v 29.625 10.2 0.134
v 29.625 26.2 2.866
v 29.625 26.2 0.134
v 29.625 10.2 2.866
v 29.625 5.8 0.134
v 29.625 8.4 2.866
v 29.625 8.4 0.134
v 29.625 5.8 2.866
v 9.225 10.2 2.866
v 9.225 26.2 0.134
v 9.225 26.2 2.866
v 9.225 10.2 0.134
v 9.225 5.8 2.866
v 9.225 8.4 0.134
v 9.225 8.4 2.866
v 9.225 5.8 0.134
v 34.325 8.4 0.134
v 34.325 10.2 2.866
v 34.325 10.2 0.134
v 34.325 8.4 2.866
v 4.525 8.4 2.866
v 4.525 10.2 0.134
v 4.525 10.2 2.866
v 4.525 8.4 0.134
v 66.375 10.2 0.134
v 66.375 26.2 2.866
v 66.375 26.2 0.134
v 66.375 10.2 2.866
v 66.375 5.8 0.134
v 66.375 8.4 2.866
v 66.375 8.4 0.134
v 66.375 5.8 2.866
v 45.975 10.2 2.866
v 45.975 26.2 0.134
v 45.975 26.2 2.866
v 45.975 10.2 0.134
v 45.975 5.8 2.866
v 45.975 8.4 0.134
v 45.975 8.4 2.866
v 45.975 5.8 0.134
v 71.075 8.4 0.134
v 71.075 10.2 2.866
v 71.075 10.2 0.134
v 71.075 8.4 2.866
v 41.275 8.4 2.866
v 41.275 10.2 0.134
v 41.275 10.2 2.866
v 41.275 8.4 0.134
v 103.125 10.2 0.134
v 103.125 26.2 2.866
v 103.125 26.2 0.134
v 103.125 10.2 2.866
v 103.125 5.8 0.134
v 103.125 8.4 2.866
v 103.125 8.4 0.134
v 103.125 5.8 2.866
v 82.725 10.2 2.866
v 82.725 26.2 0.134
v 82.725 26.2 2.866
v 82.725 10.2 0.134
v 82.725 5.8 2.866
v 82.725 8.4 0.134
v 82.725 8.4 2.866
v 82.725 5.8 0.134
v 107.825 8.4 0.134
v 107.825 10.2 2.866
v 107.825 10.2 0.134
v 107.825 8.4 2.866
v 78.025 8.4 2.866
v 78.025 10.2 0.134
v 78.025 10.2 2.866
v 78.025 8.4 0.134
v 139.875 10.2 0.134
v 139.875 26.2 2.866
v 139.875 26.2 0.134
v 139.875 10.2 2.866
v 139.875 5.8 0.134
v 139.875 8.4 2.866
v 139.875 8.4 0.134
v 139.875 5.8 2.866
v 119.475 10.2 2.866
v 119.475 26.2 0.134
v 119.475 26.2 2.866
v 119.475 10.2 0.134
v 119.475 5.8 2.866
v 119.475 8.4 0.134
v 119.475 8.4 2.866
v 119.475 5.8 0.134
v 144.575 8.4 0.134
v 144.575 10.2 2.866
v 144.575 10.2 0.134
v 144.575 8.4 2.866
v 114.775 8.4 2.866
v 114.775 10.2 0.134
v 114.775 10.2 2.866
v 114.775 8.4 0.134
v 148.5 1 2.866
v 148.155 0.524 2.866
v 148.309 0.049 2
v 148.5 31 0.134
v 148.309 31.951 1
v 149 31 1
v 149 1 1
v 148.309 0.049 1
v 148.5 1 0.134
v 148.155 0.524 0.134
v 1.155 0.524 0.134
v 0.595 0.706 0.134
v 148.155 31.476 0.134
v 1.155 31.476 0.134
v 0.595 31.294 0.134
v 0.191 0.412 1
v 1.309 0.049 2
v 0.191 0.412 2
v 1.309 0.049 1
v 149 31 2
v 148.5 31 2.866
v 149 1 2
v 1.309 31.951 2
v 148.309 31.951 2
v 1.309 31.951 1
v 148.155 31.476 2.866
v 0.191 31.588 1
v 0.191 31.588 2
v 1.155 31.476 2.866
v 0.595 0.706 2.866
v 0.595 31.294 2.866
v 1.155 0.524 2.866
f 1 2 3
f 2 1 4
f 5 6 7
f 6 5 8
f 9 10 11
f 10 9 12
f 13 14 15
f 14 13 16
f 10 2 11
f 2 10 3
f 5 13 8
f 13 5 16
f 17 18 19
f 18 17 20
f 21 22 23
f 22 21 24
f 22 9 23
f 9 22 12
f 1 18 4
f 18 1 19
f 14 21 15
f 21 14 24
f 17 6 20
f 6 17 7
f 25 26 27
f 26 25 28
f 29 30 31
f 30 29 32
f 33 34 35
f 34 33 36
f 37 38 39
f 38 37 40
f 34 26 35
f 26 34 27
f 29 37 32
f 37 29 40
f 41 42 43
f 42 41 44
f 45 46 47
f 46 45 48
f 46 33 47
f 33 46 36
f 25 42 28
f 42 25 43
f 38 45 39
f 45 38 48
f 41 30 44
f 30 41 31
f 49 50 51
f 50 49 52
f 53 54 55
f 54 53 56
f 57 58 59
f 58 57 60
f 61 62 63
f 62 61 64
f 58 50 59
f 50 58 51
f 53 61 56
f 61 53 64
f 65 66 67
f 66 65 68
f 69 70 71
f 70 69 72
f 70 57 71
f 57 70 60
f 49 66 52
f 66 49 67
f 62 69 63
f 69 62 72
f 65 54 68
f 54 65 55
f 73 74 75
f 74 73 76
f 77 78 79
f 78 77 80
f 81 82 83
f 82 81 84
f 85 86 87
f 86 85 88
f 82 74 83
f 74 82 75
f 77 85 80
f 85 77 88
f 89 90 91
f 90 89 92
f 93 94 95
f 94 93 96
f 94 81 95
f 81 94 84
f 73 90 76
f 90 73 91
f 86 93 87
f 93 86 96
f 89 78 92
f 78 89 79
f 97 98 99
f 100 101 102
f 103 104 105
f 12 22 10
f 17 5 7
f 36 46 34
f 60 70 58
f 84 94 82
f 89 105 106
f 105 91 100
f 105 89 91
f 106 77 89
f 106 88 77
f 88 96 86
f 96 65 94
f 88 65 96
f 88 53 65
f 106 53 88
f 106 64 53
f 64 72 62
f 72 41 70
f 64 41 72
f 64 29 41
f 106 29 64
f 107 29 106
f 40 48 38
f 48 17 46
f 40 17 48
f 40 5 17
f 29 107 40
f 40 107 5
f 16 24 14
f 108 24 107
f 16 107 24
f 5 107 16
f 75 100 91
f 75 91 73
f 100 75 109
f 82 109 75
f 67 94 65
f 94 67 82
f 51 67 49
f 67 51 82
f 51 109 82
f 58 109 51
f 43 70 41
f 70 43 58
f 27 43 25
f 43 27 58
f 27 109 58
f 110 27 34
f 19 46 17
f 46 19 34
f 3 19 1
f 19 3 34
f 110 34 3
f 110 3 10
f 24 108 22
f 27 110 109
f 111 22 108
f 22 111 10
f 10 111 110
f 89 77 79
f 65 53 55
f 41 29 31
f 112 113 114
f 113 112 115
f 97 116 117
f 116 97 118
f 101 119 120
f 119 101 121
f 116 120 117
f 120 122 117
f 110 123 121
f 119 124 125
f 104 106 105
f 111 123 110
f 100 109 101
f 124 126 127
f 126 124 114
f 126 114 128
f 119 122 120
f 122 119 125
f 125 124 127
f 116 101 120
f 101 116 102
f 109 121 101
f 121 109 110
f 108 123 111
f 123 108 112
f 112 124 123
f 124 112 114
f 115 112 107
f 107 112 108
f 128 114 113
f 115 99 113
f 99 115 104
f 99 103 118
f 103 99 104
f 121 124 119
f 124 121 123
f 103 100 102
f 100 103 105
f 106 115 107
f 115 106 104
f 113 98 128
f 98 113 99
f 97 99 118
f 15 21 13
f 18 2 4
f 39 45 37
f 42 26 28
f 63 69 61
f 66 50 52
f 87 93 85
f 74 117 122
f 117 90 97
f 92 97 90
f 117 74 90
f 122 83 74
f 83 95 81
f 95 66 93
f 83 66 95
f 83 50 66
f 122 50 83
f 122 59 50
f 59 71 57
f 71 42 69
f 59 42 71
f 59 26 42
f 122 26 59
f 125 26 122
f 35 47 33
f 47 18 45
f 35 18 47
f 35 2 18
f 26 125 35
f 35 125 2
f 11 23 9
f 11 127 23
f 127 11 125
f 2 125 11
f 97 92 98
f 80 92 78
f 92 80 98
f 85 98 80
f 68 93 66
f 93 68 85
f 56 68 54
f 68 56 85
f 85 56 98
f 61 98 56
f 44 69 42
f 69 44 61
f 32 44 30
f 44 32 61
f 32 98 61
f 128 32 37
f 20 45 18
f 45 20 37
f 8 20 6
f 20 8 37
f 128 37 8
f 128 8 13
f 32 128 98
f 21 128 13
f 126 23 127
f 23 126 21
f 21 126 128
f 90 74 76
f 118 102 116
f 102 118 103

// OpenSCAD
// One shape with corresponding text
module camera() {
  width=20.3;
  height=20.3;
  depth=30;
  union() {
    cube(size=[width, height, depth], center=false);
    //cube(size[width,
  }
}

//camera();

module roundedCube(xlen,ylen,zlen,radius){
  hull(){
    translate([radius,radius,radius]) sphere(r=radius);
    translate([xlen + radius , radius , radius]) sphere(r=radius);
    translate([radius , ylen + radius , radius]) sphere(r=radius);    
    translate([xlen + radius , ylen + radius , radius]) sphere(r=radius);
    translate([radius , radius , zlen + radius]) sphere(r=radius);
    translate([xlen + radius , radius , zlen + radius]) sphere(r=radius);
    translate([radius,ylen + radius,zlen + radius]) sphere(r=radius);
    translate([xlen + radius,ylen + radius,zlen + radius]) sphere(r=radius);
  }
}

module camera(width, height, depth) {

    // The cutout support
    support=[29.8, 1.8, depth];
    
    union() {
        cube(size=[width, height, depth], center=false);
        //roundedCube(width, height, depth, 3);
        translate([-((29.8-width)/2), height-17.8, 0])
        cube(support, center=false);
    }
}

module cameraBoard(qty, margin) {

  camera_width = 20.4;
  camera_height = 20.4;
  full_camera_width = 35.5;

  height = 30;
  rounding = 1; // Affects total depth a lot

  length = qty * full_camera_width + margin;
  depth = 1;

  spacing = length / qty;
  padding = ((spacing-20.3) / 2) + rounding;

  echo(length);

  yspace=rounding + (height-camera_height) / 2;

  difference() {
    // Base
    roundedCube(length, 30, depth, rounding);

    for ( i = [0 : qty-1] ) {
        translate([padding + (i * spacing), yspace, 0])
            camera(camera_width, camera_height, depth+(rounding*2));

    }
  }
}

cameraBoard(qty=4, margin=5);
